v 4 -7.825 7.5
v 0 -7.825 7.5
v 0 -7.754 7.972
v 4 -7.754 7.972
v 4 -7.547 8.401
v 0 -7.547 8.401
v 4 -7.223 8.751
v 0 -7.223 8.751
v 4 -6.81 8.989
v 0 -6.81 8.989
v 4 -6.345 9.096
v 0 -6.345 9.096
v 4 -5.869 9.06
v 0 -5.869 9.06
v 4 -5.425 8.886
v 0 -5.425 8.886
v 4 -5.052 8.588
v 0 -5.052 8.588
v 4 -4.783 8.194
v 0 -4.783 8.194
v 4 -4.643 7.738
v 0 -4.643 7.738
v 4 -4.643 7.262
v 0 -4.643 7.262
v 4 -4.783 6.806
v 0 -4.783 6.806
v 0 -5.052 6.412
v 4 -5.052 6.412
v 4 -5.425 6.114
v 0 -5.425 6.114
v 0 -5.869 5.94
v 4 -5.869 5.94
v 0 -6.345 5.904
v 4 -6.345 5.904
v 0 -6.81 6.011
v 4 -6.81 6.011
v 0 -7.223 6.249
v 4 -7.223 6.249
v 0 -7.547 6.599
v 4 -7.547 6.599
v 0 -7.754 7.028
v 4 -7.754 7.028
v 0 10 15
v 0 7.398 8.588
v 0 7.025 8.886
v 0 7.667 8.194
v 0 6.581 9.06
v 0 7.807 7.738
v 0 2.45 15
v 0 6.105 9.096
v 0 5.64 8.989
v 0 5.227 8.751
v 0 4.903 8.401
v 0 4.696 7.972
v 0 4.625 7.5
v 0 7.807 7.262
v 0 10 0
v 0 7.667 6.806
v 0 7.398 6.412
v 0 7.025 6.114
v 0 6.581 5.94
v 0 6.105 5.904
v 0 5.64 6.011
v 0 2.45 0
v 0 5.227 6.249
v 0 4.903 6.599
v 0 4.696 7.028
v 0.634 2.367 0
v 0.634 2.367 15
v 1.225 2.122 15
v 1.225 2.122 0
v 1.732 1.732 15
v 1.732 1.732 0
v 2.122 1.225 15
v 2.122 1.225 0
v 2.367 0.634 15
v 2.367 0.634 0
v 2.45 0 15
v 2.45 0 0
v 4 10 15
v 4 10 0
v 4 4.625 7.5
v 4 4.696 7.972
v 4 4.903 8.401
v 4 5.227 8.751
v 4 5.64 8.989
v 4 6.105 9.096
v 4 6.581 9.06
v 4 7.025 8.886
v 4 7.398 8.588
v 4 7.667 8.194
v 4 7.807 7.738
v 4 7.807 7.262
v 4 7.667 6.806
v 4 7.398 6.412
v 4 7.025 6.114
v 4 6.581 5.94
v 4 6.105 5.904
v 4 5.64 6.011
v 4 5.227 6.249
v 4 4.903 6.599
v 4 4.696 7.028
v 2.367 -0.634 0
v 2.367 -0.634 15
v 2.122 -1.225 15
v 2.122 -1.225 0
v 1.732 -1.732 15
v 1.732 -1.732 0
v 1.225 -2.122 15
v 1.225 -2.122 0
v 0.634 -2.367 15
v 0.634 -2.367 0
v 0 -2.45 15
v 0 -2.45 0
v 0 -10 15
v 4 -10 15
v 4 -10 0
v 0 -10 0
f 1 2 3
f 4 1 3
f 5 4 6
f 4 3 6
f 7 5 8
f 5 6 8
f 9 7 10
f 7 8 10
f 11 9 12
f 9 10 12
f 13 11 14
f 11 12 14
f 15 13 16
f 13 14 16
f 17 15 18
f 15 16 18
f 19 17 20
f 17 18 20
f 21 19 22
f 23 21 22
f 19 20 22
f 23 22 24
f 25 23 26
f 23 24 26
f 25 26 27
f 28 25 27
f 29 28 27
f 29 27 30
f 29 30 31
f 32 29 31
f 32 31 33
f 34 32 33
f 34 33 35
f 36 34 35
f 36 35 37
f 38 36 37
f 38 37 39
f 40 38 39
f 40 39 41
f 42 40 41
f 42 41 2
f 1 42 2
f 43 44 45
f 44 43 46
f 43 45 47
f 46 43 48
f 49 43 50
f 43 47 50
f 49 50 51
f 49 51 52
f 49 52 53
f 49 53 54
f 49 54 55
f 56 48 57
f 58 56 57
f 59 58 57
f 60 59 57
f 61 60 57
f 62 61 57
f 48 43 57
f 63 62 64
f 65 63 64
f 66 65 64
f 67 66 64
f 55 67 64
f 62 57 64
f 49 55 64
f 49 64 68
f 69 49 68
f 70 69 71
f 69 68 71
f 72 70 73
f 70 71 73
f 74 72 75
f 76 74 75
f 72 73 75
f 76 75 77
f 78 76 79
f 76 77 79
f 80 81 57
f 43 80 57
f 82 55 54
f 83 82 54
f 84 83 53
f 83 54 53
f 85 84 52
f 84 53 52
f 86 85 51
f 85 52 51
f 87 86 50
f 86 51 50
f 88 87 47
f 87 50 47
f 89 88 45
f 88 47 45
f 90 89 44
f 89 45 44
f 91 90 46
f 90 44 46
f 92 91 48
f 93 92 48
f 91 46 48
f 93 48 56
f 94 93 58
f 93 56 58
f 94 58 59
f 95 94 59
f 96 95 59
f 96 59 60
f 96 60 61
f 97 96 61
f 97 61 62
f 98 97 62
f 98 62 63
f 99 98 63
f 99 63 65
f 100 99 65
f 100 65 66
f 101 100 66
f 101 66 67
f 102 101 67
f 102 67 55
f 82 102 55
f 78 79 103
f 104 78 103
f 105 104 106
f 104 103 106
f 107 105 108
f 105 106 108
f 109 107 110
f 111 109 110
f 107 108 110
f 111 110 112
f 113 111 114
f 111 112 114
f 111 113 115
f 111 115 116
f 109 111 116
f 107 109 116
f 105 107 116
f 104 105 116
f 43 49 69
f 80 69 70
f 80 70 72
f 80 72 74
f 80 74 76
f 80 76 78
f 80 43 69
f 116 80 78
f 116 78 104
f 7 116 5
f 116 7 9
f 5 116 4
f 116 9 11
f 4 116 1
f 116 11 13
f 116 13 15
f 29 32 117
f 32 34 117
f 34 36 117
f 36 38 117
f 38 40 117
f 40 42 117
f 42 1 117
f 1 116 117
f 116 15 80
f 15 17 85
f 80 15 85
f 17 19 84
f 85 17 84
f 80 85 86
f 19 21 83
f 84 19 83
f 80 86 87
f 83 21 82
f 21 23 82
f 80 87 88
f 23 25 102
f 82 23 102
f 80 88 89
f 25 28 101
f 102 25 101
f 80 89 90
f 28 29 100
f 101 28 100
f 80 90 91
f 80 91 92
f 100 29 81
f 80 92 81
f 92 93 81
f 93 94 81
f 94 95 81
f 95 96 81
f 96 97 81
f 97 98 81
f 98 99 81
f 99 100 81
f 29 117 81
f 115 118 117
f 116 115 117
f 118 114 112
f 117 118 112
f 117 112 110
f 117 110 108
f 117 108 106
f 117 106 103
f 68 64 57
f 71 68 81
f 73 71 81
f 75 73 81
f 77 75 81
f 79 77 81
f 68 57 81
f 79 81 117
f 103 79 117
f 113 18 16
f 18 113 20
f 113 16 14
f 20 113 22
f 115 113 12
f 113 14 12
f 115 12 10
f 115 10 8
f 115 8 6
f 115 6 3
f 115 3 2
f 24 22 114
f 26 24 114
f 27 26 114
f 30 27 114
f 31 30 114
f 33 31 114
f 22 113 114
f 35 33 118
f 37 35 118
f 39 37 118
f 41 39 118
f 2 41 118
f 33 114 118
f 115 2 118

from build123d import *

# Parameters (mm, degrees)
F1_DEPTH = 15
F3_DEPTH = 25
F4_R     = 1.6
F5_DEPTH = 25


with BuildPart() as f1:
    # F0 (on Top) → F1 (new body)
    with BuildSketch(Plane.XY):
        with BuildLine():
            ThreePointArc((0, 4), (2.8284271247, 2.8284271247), (4, 0))
            Line((4, 0), (4, 10))
            Line((4, 10), (0, 10))
            Line((0, 10), (0, 4))
        make_face()
        with BuildLine():
            Line((4, -10), (4, 0))
            ThreePointArc((4, 0), (2.8284271247, -2.8284271247), (0, -4))
            Line((0, -4), (0, -10))
            Line((0, -10), (4, -10))
        make_face()
        with BuildLine():
            ThreePointArc((0, 2.45), (1.7324116139, 1.7324116139), (2.45, 0))
            Line((2.45, 0), (4, 0))
            ThreePointArc((4, 0), (2.8284271247, 2.8284271247), (0, 4))
            Line((0, 4), (0, 2.45))
        make_face()
        with BuildLine():
            Line((4, 0), (2.45, 0))
            ThreePointArc((2.45, 0), (1.7324116139, -1.7324116139), (0, -2.45))
            Line((0, -2.45), (0, -4))
            ThreePointArc((0, -4), (2.8284271247, -2.8284271247), (4, 0))
        make_face()
    extrude(amount=F1_DEPTH)

    # F2 (on face) → F3 (cut)
    with BuildSketch(Plane(origin=(0, 0, 0), x_dir=(0, -1, 0), z_dir=(-1, 0, 0))):
        with BuildLine():
            ThreePointArc((4.625, 7.5), (6.225, 5.9), (7.825, 7.5))
            Line((7.825, 7.5), (4.625, 7.5))
        make_face()
        with BuildLine():
            Line((4.625, 7.5), (7.825, 7.5))
            ThreePointArc((7.825, 7.5), (6.225, 9.1), (4.625, 7.5))
        make_face()
    extrude(amount=-F3_DEPTH, mode=Mode.SUBTRACT)

    # F4 (on face) → F5 (cut)
    with BuildSketch(Plane(origin=(0, 0, 0), x_dir=(0, -1, 0), z_dir=(-1, 0, 0))):
        with Locations((-6.225, 7.5)):
            Circle(F4_R)
    extrude(amount=-F5_DEPTH, mode=Mode.SUBTRACT)


solid = f1.part
